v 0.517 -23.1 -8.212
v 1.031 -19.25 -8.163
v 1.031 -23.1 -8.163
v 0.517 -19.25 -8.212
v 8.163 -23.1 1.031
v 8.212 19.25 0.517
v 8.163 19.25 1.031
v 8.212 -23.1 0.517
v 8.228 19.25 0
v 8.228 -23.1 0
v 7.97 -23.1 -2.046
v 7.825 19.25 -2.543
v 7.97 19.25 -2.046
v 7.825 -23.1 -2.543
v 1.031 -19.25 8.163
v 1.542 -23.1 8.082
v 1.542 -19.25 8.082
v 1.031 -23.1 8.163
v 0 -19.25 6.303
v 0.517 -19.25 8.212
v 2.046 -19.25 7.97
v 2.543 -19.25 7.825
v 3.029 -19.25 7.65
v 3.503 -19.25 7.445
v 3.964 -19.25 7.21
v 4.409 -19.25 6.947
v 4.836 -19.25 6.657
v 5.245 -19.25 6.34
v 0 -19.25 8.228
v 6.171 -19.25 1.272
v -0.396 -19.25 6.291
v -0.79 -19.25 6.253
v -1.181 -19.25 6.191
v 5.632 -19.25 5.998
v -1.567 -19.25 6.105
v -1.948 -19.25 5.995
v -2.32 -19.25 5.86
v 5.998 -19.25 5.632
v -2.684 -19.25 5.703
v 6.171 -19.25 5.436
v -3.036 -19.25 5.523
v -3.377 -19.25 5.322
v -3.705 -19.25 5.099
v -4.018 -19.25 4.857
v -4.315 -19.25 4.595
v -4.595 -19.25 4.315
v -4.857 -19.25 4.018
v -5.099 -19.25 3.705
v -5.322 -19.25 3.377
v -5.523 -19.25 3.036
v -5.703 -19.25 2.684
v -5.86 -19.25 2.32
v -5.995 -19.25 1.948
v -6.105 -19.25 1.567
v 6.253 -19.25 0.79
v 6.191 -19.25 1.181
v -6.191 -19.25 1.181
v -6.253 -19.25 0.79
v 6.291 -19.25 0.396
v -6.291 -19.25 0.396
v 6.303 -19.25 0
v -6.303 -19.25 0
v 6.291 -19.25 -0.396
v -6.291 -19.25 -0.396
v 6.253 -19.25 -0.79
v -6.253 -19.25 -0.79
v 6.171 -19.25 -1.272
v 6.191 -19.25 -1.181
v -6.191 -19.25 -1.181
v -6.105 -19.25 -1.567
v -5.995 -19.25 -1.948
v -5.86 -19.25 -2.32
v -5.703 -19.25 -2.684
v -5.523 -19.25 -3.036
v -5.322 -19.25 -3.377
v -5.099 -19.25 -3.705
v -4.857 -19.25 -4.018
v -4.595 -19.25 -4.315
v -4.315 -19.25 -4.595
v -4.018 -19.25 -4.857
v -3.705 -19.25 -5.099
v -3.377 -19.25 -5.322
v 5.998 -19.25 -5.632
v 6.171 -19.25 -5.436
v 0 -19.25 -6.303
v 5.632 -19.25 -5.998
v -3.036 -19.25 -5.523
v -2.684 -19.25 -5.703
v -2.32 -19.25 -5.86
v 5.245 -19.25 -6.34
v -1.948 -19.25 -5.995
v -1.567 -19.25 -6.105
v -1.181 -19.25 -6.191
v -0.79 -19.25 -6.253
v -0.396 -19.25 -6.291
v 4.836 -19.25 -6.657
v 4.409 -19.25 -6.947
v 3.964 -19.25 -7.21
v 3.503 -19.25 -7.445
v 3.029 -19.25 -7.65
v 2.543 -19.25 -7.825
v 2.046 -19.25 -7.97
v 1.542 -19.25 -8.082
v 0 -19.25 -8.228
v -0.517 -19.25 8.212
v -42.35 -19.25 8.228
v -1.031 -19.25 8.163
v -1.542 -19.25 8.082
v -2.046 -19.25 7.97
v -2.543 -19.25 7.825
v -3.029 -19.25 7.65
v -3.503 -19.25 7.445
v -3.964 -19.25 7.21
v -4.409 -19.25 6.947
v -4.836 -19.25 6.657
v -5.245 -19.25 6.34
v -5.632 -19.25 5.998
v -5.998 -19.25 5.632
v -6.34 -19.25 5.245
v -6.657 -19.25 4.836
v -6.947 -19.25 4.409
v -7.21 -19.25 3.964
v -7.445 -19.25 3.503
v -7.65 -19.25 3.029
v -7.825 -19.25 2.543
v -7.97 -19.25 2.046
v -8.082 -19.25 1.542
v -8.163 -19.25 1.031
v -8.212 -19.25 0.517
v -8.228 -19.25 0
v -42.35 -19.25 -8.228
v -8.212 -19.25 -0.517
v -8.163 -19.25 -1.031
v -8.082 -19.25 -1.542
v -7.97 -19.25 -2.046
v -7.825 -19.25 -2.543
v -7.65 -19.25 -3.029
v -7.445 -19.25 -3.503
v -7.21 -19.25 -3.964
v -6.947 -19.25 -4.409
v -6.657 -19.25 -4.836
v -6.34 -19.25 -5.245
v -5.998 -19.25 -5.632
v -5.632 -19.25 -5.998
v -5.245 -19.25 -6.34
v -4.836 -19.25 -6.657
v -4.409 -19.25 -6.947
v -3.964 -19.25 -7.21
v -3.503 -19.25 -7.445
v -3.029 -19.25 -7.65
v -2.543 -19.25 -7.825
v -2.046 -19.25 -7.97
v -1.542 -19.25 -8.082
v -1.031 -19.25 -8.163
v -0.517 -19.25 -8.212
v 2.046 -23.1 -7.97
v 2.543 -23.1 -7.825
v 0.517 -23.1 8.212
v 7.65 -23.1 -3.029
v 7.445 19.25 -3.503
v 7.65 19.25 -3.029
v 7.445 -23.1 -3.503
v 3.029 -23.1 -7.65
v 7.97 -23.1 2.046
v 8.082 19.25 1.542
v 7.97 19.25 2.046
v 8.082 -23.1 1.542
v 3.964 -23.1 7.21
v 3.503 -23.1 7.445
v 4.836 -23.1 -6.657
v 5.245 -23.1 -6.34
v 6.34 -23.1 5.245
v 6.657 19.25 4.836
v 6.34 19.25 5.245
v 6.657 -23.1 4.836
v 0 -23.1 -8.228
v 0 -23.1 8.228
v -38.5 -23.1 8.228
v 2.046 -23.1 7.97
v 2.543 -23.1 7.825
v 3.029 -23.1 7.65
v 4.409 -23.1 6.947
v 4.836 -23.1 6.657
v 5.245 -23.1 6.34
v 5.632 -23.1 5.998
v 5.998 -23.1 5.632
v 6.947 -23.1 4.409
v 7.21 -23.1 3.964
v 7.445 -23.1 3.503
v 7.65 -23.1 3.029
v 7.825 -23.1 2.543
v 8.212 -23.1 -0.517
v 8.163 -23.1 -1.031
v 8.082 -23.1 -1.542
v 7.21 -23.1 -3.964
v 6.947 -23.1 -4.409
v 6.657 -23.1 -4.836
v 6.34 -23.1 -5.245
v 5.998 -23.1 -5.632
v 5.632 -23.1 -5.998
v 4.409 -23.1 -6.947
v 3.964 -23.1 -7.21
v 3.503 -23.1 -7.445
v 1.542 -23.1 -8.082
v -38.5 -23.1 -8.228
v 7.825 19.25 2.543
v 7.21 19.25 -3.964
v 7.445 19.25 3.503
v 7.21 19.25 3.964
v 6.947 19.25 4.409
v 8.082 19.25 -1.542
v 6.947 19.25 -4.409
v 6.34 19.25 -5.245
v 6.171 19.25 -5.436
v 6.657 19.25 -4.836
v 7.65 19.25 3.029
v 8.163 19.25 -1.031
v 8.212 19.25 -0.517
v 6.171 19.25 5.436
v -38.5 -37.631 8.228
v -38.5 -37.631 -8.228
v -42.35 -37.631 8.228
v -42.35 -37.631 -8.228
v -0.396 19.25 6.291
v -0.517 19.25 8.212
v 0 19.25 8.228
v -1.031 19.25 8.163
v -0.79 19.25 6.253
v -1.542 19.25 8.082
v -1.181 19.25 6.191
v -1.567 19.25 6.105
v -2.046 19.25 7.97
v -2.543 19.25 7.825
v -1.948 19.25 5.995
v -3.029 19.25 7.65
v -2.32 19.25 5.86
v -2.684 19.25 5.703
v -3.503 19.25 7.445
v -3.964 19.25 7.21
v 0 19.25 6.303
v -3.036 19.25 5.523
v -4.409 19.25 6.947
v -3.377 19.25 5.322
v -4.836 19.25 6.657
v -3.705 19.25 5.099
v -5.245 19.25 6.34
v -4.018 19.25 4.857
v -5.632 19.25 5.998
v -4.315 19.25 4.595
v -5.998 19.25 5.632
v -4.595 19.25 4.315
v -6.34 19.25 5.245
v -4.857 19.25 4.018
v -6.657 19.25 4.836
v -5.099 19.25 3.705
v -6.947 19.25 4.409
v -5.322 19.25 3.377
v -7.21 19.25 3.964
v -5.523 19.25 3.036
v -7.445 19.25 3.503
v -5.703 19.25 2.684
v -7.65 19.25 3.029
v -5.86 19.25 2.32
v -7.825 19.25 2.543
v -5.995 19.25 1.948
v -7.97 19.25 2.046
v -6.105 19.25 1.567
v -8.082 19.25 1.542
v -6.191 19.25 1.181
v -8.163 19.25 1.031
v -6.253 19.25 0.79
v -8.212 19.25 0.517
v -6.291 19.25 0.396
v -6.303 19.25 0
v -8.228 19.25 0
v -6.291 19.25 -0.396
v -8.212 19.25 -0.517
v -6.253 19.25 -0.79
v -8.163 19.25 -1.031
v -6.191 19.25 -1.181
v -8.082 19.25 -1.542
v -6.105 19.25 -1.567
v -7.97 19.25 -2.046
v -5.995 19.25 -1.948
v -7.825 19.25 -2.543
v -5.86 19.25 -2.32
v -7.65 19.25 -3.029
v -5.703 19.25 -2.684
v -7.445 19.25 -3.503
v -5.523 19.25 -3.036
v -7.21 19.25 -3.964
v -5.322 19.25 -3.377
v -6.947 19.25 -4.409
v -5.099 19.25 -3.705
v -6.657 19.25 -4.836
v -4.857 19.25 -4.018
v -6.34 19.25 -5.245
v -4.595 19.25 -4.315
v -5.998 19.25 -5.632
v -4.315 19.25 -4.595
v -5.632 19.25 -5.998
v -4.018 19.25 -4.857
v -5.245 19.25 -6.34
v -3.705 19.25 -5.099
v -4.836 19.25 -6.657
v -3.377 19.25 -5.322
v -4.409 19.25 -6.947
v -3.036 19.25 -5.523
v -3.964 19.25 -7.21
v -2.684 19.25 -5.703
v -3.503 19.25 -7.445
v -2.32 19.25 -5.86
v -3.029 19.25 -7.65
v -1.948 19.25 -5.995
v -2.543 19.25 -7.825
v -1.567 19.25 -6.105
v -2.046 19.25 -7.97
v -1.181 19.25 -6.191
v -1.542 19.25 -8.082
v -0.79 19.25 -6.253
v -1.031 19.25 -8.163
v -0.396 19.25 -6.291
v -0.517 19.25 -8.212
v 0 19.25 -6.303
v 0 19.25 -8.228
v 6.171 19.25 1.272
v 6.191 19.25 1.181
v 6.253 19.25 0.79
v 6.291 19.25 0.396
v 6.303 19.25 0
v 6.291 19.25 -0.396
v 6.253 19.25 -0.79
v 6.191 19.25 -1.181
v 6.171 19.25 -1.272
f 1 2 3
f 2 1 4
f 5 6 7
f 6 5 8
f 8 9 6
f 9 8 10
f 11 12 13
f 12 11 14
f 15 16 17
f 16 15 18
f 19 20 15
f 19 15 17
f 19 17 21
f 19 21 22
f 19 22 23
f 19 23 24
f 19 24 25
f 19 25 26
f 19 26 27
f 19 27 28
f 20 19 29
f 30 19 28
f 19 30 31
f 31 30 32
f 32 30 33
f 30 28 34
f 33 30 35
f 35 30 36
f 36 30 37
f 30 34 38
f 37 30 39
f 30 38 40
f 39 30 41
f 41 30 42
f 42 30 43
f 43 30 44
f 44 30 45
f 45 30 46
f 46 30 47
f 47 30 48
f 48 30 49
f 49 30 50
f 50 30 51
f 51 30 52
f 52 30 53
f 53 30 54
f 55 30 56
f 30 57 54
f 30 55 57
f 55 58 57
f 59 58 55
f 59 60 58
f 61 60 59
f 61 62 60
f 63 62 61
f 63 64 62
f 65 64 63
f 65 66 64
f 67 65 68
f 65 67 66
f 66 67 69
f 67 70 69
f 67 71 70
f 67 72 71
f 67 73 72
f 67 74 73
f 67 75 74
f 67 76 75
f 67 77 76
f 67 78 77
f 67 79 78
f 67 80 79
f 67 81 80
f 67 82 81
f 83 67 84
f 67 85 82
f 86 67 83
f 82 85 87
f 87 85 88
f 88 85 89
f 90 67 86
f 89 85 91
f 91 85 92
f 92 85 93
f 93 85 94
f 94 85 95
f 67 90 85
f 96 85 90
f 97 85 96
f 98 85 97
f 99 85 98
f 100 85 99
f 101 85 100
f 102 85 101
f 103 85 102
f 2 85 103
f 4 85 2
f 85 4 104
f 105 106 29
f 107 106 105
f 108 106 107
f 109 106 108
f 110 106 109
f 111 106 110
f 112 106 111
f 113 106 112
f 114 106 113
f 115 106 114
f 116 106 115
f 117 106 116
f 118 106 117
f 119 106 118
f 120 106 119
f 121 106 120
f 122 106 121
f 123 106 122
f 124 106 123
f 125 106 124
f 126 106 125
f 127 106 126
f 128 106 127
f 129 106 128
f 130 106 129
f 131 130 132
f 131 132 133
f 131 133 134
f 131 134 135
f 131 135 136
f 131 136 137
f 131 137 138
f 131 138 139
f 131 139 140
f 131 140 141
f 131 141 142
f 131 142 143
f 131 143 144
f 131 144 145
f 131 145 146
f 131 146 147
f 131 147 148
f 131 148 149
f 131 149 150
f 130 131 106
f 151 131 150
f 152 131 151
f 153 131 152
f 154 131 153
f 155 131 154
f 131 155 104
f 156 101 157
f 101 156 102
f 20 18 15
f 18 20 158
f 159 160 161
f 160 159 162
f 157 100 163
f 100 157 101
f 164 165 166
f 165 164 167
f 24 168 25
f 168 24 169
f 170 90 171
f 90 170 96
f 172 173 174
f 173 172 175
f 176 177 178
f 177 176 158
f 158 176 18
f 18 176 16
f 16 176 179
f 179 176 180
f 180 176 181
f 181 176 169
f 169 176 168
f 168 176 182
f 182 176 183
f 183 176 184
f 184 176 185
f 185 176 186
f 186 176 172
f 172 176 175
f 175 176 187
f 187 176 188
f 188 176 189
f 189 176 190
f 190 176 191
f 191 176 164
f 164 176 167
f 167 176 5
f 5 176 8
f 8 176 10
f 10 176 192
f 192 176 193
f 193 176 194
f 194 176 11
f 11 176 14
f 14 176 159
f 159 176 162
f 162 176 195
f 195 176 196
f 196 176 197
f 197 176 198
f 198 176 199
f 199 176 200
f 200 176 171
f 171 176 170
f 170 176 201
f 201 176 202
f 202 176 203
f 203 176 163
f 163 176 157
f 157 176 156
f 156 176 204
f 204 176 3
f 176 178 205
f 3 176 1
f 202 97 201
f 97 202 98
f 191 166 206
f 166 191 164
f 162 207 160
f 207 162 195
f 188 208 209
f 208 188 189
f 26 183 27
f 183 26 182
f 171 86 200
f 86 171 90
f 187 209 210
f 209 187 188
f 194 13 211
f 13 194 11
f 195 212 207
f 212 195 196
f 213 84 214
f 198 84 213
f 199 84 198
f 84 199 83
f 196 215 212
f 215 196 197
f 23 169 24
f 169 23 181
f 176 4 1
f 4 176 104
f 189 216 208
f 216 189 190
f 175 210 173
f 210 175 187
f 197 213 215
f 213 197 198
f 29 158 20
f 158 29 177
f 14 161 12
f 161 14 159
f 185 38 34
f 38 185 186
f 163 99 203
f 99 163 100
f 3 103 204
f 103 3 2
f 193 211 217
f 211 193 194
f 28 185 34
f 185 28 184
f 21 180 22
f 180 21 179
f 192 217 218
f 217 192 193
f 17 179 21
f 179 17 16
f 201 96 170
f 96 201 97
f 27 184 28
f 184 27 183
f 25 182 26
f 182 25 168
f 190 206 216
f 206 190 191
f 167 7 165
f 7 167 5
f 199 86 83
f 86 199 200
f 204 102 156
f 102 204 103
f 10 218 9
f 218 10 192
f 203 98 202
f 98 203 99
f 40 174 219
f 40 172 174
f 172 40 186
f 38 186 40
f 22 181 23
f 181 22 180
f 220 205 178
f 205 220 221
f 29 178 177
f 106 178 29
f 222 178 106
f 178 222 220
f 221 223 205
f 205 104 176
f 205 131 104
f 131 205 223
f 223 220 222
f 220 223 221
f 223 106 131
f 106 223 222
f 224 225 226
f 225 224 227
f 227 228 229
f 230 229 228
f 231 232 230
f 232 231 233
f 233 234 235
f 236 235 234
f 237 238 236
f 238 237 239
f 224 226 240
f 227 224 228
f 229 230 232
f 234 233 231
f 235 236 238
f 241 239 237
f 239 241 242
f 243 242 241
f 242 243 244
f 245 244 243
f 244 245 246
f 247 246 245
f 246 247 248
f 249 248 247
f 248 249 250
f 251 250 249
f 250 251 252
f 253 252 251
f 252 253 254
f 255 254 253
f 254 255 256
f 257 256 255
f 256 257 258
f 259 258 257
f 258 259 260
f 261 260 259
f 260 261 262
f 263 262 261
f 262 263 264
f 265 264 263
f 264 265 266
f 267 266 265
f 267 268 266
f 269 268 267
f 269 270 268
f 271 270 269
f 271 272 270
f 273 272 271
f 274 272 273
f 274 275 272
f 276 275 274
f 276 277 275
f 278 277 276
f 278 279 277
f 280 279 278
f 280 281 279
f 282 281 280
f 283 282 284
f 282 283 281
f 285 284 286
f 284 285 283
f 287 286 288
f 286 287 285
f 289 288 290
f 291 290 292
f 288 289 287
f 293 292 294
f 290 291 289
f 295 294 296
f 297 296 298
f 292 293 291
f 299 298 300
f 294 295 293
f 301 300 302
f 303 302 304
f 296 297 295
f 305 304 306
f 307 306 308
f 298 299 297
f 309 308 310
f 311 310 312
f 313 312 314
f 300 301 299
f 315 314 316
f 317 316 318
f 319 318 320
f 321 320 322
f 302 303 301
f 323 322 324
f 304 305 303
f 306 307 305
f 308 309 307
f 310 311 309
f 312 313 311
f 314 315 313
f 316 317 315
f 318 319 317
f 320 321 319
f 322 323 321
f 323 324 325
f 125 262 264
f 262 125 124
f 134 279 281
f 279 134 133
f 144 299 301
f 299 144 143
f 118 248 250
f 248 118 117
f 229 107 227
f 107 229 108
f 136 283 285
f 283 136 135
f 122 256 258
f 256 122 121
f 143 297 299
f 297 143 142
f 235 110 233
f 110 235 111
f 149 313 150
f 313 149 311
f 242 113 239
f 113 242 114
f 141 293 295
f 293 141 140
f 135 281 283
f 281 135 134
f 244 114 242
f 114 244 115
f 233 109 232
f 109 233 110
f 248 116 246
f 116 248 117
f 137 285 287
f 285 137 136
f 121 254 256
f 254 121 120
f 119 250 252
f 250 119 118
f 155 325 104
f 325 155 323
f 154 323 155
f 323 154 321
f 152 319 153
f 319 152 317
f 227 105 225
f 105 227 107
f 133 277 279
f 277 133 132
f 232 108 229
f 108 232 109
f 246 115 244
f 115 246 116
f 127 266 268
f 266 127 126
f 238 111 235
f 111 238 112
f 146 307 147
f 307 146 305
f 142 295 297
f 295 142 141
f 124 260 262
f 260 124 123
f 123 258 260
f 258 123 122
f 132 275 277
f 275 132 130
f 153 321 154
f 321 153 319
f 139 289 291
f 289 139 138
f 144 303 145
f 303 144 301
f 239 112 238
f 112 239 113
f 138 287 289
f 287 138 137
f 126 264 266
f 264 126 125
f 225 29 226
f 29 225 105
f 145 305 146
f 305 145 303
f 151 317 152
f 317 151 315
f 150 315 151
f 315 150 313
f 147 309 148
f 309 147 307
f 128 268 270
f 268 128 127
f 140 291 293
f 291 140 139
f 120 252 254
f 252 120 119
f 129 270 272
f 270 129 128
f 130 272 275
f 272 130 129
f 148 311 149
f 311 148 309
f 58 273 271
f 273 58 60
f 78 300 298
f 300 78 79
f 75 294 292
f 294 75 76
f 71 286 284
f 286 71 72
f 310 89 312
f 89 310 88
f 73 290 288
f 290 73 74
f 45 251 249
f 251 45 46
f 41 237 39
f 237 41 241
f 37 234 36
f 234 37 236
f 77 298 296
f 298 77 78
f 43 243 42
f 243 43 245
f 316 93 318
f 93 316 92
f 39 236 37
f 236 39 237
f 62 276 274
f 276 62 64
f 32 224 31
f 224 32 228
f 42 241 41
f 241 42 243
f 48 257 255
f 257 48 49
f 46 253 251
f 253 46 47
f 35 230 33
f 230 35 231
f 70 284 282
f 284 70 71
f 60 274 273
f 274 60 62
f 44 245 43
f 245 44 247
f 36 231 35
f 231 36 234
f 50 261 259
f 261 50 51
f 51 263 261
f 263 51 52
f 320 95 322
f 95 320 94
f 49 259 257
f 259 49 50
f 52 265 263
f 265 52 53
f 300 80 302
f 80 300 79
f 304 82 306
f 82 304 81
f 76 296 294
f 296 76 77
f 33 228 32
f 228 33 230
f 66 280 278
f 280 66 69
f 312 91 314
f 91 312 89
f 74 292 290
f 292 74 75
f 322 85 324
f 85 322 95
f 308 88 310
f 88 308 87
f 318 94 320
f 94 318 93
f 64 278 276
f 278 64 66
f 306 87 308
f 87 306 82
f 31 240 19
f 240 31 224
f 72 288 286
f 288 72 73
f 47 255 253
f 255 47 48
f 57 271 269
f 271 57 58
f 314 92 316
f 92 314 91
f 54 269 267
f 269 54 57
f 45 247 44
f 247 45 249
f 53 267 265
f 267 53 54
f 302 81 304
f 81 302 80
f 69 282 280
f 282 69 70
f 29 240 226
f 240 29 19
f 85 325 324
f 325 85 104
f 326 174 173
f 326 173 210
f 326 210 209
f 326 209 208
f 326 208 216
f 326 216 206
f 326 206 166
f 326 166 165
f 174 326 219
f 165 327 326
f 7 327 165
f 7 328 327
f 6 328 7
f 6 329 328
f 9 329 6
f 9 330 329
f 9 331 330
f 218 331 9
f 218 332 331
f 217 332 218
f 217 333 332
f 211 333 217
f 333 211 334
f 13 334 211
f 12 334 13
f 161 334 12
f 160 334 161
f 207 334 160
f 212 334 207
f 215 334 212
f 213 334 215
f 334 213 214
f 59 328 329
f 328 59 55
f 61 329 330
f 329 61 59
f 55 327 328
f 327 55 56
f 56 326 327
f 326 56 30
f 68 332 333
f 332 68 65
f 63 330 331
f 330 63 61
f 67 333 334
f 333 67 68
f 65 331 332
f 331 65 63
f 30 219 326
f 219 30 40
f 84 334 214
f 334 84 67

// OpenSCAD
//Variables


//Percent of tolerance for the printer and such. Chances are the hinge holes are not going to fit if they are the exact same size, and considering the innacuracies of printers, tolerance is essential. By adding this printer tolerance (and just tolerance in general), you allow yourself to input exact variables in the variables and not worry about things being too small (because that is factored in). 
printertolerancepercent=10;

//The diameter of the hinge
diameterofhinge=11.46;

//Length of the hinge holder piece. Past a certain point is unnecesary
lengthofbracket=35;


//Fraction of remaining hinge holder piece. 
fractionofholderremains=1/2;

//The overall thickness of the hook and the bracket.
overallthickness=3.5;

//Length of the hook
lengthofhook=35;

//Height of the hook ending
heightofhook=11.46;

//Detail of circles (higher=more, but more circle detail equals longer render time)
sfn=100;

//IGNORE (variables with percent error added in; these variables are the ones utilized by the modules below)

printertolerance=(printertolerancepercent+100)/100;

//Variable to have a back piece to hold onto the hinge. O=no, 1=yes.
backpiece=1;

//Fraction of the backpiece that is still showing. Does not apply if there is no backpiece. 
backpiecefraction=1/8;


//Modules



//The piece that hangs on the hinge
module hingeholder() {
	difference() {
		difference() {
			cylinder(r=(diameterofhinge+overallthickness)/2, h=lengthofbracket, center=true, $fn=sfn);
			cylinder(r=diameterofhinge/2, h=lengthofbracket+2, center=true, $fn=sfn);
		}
		translate([(diameterofhinge+overallthickness)*fractionofholderremains,0, 0]) {
			cube([diameterofhinge+overallthickness, diameterofhinge+overallthickness, lengthofbracket+2], center=true);
		}
	}	

	scale([backpiece, backpiece, backpiece]) {
		difference() {
			difference() {
				cylinder(r=(diameterofhinge+overallthickness)/2, h=lengthofbracket, center=true, $fn=sfn);
				cylinder(r=diameterofhinge/2, h=lengthofbracket+2, center=true, $fn=sfn);
			}
			translate([(diameterofhinge+overallthickness)*-backpiecefraction,0, 0]) {
				cube([diameterofhinge+overallthickness, diameterofhinge+overallthickness, lengthofbracket+2], center=true);
			}
		}	
	}
}



//The hook that is connected to the hinge holder
module hook() {

	//Since the hook coverup is centered, we have to move it up to compensate for the length of the bracket and the thickness of the hook. We divide by two because it is in the center, and to get to the right place it only needs to go halfway. 
    translate([0,0,(lengthofbracket+overallthickness)/2]) {
//We make the radius the diameter of the hinge plus the bracket thickness divided by two because wee need a radius that matches the hingeholder, and that is not the inside diameter, but the outside diameter, which can be found by adding the thickness of the bracket and the hinge diameter. 
        cylinder(r=(diameterofhinge+overallthickness)/2, h=overallthickness, center=true, $fn=sfn);
    }

	//This is the physical hook. We start by moving it over to compensate by the length of the hook (which is currently centered) and raise it to compensate for the length of said braket and thickness of the hook. 
    translate([(lengthofhook)/-2,0, (lengthofbracket+overallthickness)/2]) {
		//This cube is the length of the hook. Is the same thickness as all other parts and its dimensions are as such. 
        cube([lengthofhook, diameterofhinge+overallthickness, overallthickness], center=true);
    }

//Before the translation, the cube (actually rectangular prism) is in the middle. We  have to move it over so that it is halfway touching the sphere to make it blend in.
    translate([(lengthofhook+overallthickness)/-1, (diameterofhinge+overallthickness)/-2, lengthofbracket/2]) {
        cube([overallthickness,diameterofhinge+overallthickness, heightofhook+overallthickness*1.5]);
    }

}



module final() {
	scale([1+printertolerancepercent/100,1+printertolerancepercent/100,1+printertolerancepercent/100]) {
		rotate([90,0,0]) {
			hook();
			hingeholder();
		}
	}
}

final();
